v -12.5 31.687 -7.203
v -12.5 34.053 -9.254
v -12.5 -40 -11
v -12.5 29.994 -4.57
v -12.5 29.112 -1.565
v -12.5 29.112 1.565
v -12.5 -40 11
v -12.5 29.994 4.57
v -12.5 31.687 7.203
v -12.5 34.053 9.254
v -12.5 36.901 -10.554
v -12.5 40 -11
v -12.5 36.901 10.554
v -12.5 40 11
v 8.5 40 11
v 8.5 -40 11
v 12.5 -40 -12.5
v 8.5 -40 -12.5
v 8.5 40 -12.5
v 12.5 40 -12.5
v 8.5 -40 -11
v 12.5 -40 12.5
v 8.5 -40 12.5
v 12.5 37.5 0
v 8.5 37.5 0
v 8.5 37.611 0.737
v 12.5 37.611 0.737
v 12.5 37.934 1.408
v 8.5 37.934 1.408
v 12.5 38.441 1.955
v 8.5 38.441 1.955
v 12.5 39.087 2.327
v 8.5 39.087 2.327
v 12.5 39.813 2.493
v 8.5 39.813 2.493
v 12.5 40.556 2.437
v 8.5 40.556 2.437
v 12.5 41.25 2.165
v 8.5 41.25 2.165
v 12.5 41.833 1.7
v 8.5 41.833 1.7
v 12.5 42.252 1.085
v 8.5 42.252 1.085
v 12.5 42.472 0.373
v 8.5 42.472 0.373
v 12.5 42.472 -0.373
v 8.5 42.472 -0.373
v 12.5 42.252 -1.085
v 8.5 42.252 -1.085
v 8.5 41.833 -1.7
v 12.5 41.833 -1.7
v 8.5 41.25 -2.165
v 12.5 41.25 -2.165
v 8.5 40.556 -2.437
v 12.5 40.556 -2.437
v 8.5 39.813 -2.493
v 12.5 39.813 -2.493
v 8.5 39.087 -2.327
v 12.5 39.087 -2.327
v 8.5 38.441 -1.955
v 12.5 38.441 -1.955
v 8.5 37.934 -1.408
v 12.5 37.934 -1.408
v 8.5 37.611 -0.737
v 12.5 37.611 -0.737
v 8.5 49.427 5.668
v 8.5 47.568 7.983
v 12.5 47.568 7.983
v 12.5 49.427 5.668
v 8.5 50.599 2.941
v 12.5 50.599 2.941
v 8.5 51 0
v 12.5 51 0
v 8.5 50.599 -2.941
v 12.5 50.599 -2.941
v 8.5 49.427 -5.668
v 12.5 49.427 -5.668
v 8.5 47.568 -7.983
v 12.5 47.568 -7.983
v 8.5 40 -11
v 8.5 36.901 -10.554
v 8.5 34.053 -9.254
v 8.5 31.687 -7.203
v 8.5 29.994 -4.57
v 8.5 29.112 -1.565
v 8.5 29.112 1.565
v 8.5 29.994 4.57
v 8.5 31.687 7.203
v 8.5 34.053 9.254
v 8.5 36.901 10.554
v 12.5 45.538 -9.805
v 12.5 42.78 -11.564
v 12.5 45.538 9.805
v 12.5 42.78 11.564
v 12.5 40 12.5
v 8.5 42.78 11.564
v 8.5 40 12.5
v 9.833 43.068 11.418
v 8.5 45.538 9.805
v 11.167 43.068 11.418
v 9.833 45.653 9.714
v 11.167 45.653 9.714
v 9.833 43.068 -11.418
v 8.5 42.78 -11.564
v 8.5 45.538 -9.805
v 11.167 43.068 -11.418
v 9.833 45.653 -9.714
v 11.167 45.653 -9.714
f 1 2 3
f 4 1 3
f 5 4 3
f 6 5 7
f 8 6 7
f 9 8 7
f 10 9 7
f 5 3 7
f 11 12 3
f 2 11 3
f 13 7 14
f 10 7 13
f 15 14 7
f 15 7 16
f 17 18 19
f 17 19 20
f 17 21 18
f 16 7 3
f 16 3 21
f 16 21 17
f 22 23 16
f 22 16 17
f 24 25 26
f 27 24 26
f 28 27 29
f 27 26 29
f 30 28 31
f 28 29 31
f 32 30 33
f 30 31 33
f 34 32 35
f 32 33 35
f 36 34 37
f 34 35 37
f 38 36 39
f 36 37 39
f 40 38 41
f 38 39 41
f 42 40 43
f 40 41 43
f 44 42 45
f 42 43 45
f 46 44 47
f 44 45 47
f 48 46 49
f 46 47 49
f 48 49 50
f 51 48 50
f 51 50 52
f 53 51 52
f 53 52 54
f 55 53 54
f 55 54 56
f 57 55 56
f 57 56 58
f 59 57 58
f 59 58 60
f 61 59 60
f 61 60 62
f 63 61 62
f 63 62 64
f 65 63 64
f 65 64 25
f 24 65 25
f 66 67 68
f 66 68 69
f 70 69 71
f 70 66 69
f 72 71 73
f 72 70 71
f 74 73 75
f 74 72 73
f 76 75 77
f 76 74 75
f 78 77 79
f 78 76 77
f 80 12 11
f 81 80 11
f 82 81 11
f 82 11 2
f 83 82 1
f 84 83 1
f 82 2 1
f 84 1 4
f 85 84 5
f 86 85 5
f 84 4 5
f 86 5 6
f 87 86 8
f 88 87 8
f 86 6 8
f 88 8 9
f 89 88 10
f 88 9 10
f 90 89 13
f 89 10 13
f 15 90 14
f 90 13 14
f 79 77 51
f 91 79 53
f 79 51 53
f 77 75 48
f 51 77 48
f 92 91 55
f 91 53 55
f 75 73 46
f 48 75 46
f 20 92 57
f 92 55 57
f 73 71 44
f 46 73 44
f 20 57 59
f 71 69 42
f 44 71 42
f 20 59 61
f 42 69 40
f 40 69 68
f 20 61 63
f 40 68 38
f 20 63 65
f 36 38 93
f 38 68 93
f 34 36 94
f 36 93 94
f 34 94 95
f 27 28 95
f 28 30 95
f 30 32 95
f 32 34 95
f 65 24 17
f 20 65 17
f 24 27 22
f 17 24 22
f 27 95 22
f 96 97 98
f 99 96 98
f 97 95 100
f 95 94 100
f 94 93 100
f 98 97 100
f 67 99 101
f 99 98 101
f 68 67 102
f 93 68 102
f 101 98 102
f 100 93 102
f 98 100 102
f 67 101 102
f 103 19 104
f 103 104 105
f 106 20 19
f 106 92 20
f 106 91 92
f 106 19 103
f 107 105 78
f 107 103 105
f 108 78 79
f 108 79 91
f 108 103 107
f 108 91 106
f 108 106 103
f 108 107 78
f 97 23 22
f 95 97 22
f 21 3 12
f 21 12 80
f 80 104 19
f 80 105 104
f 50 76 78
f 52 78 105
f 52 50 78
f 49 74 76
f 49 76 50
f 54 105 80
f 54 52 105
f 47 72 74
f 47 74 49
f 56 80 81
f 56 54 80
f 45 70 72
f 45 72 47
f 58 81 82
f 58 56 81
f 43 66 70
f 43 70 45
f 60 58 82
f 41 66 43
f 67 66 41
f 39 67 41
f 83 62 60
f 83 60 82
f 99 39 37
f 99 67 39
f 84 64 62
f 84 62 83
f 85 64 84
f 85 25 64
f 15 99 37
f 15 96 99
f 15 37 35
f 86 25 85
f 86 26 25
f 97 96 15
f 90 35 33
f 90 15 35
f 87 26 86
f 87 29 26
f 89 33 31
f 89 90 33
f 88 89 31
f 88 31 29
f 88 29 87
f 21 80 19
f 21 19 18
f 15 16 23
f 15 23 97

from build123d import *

# Parameters (mm, degrees)
F0_W      = 25
F0_H      = 25
F1_DEPTH  = 40
F2_W      = 21
F2_H      = 80
F3_DEPTH  = 1.5
F4_W      = 21
F4_H      = 80
F5_DEPTH  = 1.5
F7_DEPTH  = 21
F9_DEPTH  = 4
F10_R     = 2.5
F11_DEPTH = 4.001
F13_DEPTH = 4


with BuildPart() as f1:
    # F0 (on Front) → F1 (new body, symmetric)
    with BuildSketch(Plane.XZ):
        Rectangle(F0_W, F0_H)
    extrude(amount=F1_DEPTH, both=True)

    # F2 (on face) → F3 (cut)
    with BuildSketch(Plane.XY.offset(12.5)):
        with Locations((-2, 0)):
            Rectangle(F2_W, F2_H)
    extrude(amount=-F3_DEPTH, mode=Mode.SUBTRACT)

    # F4 (on face) → F5 (cut)
    with BuildSketch(Plane(origin=(0, 0, -12.5), x_dir=(1, 0, 0), z_dir=(0, 0, -1))):
        with Locations((-2, 0)):
            Rectangle(F4_W, F4_H)
    extrude(amount=-F5_DEPTH, mode=Mode.SUBTRACT)

    # F6 (on face) → F7 (cut)
    with BuildSketch(Plane(origin=(-12.5, 0, 0), x_dir=(0, -1, 0), z_dir=(-1, 0, 0))):
        with BuildLine():
            Line((-40, 11), (-40, -11))
            ThreePointArc((-40, -11), (-29, 0), (-40, 11))
        make_face()
    extrude(amount=-F7_DEPTH, mode=Mode.SUBTRACT)

    # F8 (on face) → F9 (join)
    with BuildSketch(Plane(origin=(8.5, 0, 0), x_dir=(0, -1, 0), z_dir=(-1, 0, 0))):
        with BuildLine():
            Line((-40, -11), (-40, 11))
            ThreePointArc((-40, 11), (-51, 0), (-40, -11))
        make_face()
    extrude(amount=-F9_DEPTH)

    # F10 (on face) → F11 (cut, through all)
    with BuildSketch(Plane(origin=(8.5, 0, 0), x_dir=(0, -1, 0), z_dir=(-1, 0, 0))):
        with Locations((-40, 0)):
            Circle(F10_R)
    extrude(amount=-F11_DEPTH, mode=Mode.SUBTRACT)

    # F12 (on face) → F13 (join)
    with BuildSketch(Plane.YZ.offset(12.5)):
        with BuildLine():
            ThreePointArc((48.771264901, 6.6381407063), (48.1972510553, 7.3351942808), (47.5679988761, 7.9828186132))
            add(Edge.make_bspline(
                [(47.5679988761, 7.9828186132), (48.3027333045, 7.2337960601), (48.7357424374, 6.6842950025), (48.771264901, 6.6381407063)],
                knots=[7.1076445711, 7.1076445711, 7.1076445711, 7.1076445711, 10.5497147991, 10.5497147991, 10.5497147991, 10.5497147991], degree=3))
        make_face()
        with BuildLine():
            add(Edge.make_bspline(
                [(40, 12.5), (43.2471029485, 11.9269308431), (46.0508214725, 9.5295000376), (47.5679988761, 7.9828186132)],
                knots=[0, 0, 0, 0, 7.1076445711, 7.1076445711, 7.1076445711, 7.1076445711], degree=3))
            Line((40, 12.5), (40, 11))
            ThreePointArc((40, 11), (44.0736344494, 10.2179010747), (47.5679988761, 7.9828186132))
        make_face()
        with BuildLine():
            add(Edge.make_bspline(
                [(47.5679988761, -7.9828186132), (48.3027333045, -7.2337960601), (48.7357424374, -6.6842950025), (48.771264901, -6.6381407063)],
                knots=[7.1076445711, 7.1076445711, 7.1076445711, 7.1076445711, 10.5497147991, 10.5497147991, 10.5497147991, 10.5497147991], degree=3))
            ThreePointArc((47.5679988761, -7.9828186132), (48.1972510553, -7.3351942808), (48.771264901, -6.6381407063))
        make_face()
        with BuildLine():
            Line((40, -11), (40, -12.5))
            add(Edge.make_bspline(
                [(40, -12.5), (43.2471029485, -11.9269308431), (46.0508214725, -9.5295000376), (47.5679988761, -7.9828186132)],
                knots=[0, 0, 0, 0, 7.1076445711, 7.1076445711, 7.1076445711, 7.1076445711], degree=3))
            ThreePointArc((47.5679988761, -7.9828186132), (44.0736344494, -10.2179010747), (40, -11))
        make_face()
    extrude(amount=-F13_DEPTH)


solid = f1.part
